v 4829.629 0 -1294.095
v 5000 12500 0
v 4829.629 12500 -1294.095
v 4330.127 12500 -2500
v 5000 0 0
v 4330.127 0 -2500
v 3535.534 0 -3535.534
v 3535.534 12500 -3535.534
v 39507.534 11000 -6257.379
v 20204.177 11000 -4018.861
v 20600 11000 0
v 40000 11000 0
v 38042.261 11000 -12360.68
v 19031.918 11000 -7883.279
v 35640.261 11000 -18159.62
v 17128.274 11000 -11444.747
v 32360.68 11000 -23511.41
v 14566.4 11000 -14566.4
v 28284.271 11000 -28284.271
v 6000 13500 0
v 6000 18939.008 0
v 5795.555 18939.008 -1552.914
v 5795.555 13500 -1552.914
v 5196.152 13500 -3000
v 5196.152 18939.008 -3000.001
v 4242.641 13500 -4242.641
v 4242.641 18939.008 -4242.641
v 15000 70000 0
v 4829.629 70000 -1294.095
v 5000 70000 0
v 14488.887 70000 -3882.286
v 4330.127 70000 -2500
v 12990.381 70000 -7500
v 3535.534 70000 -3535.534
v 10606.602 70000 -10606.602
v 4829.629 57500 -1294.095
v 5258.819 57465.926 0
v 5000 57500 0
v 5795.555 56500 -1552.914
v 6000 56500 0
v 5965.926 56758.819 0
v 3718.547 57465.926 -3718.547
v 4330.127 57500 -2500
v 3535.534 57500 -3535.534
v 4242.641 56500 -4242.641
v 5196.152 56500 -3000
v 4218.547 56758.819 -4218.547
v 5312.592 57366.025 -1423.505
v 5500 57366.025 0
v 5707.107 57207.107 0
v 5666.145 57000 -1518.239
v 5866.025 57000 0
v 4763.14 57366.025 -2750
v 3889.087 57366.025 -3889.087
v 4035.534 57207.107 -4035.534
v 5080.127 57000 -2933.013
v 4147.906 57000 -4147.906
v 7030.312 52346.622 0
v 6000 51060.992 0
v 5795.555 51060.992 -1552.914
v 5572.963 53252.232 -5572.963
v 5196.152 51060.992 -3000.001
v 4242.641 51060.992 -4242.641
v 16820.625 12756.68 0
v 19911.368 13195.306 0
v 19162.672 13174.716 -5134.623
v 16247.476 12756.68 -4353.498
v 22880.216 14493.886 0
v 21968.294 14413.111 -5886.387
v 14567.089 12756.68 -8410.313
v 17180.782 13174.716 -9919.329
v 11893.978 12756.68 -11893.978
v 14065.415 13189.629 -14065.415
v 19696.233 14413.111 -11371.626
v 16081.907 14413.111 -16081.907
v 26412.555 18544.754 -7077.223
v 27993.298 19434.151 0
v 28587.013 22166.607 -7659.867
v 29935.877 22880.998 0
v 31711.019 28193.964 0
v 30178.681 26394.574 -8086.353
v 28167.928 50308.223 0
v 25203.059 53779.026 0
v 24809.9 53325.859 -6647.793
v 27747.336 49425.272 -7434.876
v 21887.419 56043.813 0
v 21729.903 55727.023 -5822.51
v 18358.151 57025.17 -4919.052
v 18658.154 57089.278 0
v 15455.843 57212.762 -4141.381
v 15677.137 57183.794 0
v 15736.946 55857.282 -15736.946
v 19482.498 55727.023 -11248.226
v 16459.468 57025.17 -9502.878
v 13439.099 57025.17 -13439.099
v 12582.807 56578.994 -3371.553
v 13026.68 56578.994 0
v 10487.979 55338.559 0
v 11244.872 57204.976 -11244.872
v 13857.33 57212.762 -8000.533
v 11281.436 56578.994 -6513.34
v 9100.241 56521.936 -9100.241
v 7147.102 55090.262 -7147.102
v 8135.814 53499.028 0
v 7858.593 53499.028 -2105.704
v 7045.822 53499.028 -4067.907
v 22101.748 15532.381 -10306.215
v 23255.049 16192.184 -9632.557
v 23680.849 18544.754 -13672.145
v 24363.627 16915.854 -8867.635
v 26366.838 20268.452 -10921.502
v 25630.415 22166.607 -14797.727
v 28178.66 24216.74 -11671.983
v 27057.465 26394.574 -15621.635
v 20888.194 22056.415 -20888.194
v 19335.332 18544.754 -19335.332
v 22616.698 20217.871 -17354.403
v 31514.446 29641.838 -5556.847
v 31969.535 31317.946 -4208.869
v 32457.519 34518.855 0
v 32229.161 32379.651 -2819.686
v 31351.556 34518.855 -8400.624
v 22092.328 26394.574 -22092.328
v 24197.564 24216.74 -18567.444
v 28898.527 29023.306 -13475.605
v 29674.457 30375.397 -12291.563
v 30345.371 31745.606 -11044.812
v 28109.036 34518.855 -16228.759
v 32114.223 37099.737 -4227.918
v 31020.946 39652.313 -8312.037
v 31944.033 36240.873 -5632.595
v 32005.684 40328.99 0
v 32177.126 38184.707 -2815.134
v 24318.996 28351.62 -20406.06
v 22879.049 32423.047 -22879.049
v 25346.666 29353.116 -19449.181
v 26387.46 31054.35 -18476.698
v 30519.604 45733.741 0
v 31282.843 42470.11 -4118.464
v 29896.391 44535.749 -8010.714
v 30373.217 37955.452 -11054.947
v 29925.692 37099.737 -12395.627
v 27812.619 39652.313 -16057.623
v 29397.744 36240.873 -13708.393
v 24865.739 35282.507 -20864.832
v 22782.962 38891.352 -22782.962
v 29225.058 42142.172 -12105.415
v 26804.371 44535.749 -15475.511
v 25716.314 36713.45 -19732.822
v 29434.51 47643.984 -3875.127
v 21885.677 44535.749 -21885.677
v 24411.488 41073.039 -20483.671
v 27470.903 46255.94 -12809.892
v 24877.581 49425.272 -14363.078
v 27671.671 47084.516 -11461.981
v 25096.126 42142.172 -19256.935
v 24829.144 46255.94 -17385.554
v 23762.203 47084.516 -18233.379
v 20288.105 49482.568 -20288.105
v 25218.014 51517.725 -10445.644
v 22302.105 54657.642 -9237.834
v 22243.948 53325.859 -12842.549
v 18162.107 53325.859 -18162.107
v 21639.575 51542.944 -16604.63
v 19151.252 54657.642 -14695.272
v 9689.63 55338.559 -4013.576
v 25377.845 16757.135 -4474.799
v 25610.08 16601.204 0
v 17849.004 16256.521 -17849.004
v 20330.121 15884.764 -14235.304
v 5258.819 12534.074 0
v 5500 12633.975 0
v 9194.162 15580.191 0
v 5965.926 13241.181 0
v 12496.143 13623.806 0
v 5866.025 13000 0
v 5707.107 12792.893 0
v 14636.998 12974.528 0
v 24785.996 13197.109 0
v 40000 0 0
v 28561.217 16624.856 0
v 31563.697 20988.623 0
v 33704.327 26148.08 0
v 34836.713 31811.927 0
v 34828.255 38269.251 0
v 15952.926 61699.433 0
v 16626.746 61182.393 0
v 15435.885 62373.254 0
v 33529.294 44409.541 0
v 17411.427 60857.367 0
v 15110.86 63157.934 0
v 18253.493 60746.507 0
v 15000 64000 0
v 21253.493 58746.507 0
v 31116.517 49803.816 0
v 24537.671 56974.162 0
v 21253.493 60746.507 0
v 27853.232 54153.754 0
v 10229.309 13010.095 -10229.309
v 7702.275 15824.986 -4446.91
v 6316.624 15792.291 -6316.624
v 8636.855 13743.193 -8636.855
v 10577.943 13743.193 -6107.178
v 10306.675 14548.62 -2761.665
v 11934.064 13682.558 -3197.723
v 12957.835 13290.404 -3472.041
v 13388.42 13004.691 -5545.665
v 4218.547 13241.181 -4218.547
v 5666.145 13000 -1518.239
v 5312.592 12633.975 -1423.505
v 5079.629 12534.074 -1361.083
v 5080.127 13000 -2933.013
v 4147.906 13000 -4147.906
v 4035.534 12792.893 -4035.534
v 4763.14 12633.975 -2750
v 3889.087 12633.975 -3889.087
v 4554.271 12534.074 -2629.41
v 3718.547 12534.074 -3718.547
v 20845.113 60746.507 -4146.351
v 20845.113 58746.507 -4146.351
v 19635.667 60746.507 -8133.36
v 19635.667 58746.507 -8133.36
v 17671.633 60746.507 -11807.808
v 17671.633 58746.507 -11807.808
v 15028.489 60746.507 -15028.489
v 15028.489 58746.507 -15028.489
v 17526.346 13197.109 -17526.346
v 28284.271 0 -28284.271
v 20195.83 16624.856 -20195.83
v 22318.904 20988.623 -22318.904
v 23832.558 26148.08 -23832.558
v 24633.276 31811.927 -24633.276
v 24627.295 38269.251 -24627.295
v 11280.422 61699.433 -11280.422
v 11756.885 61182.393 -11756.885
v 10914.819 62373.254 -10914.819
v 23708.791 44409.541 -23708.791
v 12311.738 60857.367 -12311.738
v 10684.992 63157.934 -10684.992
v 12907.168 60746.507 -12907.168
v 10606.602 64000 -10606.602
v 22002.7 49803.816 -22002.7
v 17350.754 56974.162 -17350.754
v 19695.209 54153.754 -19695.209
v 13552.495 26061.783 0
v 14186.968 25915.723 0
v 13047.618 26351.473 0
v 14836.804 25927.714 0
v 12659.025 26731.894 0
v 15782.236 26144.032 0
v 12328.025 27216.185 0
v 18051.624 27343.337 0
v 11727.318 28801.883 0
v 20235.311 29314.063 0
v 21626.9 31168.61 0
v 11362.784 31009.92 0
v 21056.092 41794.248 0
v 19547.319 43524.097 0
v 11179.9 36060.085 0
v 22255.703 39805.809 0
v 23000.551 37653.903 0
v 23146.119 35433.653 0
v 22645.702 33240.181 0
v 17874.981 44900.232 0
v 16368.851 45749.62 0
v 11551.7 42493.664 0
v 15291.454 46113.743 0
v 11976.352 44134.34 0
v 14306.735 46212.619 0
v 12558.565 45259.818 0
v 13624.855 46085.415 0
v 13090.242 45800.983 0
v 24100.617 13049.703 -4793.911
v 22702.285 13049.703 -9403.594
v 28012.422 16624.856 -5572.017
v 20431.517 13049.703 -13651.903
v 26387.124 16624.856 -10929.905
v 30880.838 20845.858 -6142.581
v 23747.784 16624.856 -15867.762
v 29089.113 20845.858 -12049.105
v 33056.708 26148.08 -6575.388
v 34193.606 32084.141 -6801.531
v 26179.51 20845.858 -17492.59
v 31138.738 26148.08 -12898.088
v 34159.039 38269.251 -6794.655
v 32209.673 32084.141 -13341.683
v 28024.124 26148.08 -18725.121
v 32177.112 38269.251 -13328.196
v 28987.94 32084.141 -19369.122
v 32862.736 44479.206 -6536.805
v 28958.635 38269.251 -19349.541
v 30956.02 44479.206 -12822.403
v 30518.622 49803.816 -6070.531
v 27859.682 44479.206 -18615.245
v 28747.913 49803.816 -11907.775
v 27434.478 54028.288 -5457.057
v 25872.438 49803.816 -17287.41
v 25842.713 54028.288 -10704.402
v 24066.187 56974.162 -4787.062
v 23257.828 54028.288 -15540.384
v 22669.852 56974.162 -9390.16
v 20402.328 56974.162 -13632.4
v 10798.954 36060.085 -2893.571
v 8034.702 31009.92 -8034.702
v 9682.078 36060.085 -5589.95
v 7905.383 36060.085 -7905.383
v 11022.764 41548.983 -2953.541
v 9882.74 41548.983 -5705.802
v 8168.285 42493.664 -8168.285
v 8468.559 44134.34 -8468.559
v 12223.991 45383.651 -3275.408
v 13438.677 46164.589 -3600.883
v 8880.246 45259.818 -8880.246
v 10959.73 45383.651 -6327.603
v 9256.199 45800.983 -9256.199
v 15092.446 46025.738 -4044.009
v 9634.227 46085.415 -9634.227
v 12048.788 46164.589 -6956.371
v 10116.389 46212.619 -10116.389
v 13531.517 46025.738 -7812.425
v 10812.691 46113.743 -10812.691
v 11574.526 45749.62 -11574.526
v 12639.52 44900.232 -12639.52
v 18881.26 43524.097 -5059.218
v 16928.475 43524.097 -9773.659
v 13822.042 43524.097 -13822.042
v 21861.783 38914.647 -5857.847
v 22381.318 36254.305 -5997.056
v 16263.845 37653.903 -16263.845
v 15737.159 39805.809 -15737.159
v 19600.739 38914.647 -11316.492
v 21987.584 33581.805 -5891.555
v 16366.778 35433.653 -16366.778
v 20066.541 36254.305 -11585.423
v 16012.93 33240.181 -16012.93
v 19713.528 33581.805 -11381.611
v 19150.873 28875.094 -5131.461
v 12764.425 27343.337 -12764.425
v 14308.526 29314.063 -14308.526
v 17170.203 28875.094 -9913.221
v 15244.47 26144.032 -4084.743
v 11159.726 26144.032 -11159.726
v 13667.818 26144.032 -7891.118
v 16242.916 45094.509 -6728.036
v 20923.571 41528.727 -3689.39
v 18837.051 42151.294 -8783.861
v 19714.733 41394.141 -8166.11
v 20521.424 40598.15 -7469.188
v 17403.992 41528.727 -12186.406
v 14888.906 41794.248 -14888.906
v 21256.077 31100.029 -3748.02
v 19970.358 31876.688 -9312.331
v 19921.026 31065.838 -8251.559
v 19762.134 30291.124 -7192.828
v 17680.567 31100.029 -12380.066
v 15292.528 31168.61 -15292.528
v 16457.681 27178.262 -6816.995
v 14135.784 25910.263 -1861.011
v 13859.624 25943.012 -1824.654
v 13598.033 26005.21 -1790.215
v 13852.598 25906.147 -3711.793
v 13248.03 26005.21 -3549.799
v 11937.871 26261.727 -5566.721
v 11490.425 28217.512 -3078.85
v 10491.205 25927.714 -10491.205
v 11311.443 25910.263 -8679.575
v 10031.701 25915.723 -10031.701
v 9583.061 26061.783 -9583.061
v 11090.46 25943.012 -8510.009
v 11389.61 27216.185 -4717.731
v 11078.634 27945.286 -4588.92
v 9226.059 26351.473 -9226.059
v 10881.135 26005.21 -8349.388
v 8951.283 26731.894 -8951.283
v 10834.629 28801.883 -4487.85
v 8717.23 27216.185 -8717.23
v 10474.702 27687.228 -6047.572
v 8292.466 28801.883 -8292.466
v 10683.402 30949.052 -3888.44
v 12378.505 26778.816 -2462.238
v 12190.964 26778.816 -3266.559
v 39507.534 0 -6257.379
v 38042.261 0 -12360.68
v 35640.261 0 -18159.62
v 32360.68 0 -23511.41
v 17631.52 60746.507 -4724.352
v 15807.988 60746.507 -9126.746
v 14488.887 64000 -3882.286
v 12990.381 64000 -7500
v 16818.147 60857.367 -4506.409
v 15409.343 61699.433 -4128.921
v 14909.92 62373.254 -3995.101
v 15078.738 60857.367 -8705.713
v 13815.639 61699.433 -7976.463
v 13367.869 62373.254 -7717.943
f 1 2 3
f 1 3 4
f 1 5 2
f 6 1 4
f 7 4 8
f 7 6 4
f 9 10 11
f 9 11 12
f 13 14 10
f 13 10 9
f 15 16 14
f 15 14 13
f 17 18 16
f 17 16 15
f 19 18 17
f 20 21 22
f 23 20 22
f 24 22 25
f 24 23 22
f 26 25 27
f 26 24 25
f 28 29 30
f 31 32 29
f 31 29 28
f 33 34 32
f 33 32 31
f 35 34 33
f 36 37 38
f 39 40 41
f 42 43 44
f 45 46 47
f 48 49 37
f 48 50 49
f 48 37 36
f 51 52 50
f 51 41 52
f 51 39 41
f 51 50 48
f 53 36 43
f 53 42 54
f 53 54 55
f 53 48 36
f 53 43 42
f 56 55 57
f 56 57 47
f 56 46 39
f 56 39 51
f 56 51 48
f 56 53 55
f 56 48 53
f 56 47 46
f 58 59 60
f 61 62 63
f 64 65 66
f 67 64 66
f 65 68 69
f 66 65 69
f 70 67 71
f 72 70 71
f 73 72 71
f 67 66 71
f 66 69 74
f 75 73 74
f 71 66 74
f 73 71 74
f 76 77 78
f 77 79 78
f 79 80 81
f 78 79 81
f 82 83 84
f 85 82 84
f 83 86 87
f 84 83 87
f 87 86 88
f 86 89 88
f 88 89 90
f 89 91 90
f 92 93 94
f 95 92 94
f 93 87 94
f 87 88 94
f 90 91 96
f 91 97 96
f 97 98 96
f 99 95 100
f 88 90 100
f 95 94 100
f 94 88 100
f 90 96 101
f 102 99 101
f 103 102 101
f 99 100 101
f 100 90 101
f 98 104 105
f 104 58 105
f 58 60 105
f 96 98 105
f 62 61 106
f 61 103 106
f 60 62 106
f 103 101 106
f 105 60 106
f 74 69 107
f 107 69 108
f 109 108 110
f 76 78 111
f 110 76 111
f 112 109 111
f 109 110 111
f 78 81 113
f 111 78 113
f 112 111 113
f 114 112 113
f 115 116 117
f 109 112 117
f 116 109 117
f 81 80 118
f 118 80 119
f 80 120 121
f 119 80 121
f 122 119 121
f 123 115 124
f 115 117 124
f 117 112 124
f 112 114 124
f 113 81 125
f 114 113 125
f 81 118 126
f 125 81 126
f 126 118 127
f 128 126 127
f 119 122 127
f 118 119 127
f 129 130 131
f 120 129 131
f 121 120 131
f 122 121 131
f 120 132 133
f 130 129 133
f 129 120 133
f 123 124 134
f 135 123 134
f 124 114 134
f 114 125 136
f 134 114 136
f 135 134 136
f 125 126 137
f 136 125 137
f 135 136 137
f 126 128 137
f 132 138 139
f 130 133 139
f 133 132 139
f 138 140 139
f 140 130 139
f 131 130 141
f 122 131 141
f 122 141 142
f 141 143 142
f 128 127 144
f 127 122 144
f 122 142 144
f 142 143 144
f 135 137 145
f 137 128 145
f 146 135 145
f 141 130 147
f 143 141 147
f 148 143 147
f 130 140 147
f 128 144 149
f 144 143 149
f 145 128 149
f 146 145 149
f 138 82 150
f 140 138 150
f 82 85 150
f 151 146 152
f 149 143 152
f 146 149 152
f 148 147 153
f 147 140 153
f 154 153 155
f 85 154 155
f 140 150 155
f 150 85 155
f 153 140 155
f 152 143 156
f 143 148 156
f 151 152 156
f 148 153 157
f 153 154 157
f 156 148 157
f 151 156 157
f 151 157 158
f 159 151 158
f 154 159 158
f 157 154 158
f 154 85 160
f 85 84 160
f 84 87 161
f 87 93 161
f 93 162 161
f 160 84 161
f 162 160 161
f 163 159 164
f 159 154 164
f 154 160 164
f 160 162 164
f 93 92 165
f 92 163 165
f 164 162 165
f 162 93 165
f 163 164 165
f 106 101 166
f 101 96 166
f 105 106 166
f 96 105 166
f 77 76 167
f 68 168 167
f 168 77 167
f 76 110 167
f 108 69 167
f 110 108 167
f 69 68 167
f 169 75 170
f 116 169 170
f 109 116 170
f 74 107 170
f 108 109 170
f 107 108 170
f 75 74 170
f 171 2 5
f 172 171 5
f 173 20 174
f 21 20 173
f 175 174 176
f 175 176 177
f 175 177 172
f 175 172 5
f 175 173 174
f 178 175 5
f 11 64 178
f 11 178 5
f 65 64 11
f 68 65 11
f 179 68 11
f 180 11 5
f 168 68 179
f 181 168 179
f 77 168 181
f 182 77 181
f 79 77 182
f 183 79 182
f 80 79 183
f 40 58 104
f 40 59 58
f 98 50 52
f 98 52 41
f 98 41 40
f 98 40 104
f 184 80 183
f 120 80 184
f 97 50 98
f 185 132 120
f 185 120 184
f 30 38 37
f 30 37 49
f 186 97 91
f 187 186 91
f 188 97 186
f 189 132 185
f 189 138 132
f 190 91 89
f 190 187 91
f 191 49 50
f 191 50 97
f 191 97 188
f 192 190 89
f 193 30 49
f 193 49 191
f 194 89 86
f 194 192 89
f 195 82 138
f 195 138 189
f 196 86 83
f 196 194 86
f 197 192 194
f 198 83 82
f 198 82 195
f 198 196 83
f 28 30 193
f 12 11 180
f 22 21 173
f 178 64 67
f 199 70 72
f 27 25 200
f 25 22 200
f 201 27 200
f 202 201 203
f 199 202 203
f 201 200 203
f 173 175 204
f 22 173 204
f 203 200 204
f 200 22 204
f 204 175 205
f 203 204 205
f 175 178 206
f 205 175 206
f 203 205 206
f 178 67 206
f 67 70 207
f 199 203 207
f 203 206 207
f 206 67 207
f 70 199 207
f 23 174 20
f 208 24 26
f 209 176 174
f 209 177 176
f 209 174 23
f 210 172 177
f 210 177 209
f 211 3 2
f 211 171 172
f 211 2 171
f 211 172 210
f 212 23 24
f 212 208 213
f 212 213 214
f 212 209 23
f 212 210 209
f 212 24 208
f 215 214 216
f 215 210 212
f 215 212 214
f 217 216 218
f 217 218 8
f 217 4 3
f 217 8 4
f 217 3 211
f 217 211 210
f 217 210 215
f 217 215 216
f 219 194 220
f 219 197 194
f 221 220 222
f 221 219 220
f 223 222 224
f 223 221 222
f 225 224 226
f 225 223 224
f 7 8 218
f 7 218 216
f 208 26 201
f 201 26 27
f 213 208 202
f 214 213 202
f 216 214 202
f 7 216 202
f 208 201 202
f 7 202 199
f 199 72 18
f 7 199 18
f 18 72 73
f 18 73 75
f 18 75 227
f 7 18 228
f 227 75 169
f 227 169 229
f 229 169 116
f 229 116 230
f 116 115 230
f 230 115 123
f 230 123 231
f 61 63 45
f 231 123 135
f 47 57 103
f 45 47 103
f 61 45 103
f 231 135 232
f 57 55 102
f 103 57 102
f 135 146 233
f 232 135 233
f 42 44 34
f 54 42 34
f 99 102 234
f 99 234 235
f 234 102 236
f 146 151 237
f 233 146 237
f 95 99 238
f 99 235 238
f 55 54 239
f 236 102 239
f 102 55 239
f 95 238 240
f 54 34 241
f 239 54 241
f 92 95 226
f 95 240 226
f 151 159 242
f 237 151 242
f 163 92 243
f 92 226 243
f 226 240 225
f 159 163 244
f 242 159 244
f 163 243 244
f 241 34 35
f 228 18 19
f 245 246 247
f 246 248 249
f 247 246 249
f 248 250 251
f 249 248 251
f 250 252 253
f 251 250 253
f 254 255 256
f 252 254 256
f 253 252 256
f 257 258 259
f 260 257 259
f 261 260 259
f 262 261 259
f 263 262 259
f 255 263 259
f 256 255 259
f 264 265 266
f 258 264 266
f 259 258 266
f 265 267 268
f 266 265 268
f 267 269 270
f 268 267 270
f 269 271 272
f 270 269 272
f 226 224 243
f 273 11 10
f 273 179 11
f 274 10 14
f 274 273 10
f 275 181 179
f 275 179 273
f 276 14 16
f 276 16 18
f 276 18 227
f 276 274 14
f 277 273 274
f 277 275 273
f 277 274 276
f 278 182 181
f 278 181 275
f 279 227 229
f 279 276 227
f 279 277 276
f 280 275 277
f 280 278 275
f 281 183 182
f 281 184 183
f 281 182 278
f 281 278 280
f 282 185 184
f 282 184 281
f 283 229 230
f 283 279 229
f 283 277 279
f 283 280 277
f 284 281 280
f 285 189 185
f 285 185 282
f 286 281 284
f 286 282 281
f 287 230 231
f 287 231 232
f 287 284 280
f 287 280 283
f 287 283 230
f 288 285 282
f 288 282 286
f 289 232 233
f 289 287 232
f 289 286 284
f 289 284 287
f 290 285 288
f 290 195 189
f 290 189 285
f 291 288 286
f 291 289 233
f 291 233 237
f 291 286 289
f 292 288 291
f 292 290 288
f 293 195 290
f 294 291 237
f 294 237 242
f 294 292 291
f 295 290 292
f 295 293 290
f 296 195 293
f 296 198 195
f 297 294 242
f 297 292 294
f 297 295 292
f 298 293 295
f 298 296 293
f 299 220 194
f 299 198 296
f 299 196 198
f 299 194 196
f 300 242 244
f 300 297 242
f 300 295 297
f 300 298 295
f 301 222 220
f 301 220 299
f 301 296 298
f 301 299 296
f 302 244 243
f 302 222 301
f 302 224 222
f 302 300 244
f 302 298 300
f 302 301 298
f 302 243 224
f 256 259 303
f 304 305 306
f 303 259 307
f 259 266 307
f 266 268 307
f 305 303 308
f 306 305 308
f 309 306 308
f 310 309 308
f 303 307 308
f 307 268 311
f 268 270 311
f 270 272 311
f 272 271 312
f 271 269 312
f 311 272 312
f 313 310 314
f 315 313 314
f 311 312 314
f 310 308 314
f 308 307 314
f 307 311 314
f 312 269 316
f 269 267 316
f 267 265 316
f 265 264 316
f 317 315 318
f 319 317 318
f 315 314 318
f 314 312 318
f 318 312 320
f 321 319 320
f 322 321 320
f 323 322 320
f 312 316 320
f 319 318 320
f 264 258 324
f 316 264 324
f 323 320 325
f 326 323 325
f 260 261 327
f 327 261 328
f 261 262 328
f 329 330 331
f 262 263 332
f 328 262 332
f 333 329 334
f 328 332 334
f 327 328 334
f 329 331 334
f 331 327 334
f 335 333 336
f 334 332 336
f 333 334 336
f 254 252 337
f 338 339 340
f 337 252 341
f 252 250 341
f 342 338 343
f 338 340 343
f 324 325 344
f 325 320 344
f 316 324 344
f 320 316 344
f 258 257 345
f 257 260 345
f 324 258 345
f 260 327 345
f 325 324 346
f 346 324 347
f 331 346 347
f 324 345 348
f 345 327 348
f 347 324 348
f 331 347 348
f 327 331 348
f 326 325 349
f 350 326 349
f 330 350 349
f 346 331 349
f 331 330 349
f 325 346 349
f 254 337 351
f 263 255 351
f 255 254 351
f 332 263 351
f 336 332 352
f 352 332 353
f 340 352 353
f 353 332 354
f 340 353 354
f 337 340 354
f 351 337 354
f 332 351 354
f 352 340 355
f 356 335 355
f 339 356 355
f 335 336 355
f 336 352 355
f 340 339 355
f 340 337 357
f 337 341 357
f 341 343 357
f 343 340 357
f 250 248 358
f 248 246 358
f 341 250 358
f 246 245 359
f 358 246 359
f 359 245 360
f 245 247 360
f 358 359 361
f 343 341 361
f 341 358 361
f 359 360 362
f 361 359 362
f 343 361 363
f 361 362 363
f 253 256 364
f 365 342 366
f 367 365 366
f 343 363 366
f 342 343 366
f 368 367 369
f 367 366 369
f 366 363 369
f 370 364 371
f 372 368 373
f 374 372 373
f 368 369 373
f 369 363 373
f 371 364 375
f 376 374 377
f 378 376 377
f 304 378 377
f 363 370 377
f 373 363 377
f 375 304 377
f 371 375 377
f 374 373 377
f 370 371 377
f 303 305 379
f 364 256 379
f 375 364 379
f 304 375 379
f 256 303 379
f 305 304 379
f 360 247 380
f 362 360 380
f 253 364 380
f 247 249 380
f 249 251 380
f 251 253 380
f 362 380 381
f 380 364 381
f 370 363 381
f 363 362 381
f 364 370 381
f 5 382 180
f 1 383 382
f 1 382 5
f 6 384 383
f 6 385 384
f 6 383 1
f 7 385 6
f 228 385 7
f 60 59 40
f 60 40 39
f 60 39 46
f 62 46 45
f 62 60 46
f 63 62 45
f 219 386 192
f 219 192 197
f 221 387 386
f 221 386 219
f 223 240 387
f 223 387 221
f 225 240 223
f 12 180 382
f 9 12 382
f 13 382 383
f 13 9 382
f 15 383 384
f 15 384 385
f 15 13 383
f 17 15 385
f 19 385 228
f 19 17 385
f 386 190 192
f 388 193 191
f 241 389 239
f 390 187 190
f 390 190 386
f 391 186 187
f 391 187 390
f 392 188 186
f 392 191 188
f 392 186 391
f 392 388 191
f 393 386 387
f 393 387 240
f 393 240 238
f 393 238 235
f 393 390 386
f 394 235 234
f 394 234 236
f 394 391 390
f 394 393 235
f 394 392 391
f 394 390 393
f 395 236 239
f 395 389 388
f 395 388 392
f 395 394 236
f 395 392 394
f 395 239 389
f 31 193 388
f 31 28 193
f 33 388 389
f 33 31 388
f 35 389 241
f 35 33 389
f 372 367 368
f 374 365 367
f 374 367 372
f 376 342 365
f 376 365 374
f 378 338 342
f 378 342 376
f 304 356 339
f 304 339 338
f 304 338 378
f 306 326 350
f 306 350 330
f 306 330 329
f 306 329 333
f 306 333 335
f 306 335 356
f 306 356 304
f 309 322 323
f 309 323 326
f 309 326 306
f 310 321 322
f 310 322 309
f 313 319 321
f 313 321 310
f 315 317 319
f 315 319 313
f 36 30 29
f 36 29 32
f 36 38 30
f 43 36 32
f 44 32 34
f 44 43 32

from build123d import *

# Parameters (mm, degrees)
REVOLU_O2_ANGLE = 45
ESBO_O3_RX      = 22243.320272913
ESBO_O3_RY      = 15640.553132373
REVOLU_O3_ANGLE = 45


with BuildPart() as part:
    # Esboço2 → Revolução2 (revolve)
    with BuildSketch(Plane.XY):
        with BuildLine():
            Line((5000, 70000), (5000, 57500))
            ThreePointArc((5000, 57500), (5707.106781187, 57207.106781187), (6000, 56500))
            Line((6000, 56500), (6000, 13500))
            ThreePointArc((6000, 13500), (5707.106781187, 12792.893218813), (5000, 12500))
            Line((5000, 12500), (5000, 0))
            Line((5000, 0), (40000, 0))
            Line((40000, 0), (40000, 11000))
            Line((40000, 11000), (20600, 11000))
            add(Edge.make_bspline(
                [(20600, 11000), (82470.907399998, 33557.10165625), (21253.492737805, 58746.507262195)],
                knots=[3.425386763, 3.425386763, 3.425386763, 5.965177753, 5.965177753, 5.965177753], degree=2, weights=[1, 0.296380684, 1]))
            Line((21253.492737805, 58746.507262195), (21253.492737805, 60746.507262195))
            Line((21253.492737805, 60746.507262195), (18253.492737805, 60746.507262195))
            ThreePointArc((18253.492737805, 60746.507262195), (15952.925960362, 61699.433222557), (15000, 64000))
            Line((15000, 64000), (15000, 70000))
            Line((15000, 70000), (5000, 70000))
        make_face()
    revolve(axis=Axis((0, 0, 0), (0, 1, 0)), revolution_arc=REVOLU_O2_ANGLE)

    # Esboço3 → Corte-Revolução1 (revolve, cut)
    with BuildSketch(Plane.XY):
        with Locations(Location((16820.62504111, 35000), (0, 0, -90))):
            Ellipse(ESBO_O3_RX, ESBO_O3_RY)
    revolve(axis=Axis((0, 0, 0), (0, 1, 0)), mode=Mode.SUBTRACT)


with BuildPart() as body_2:
    # Esboço4 → Revolução3 (revolve)
    with BuildSketch(Plane.XY):
        with BuildLine():
            add(Edge.make_bspline(
                [(11179.900249992, 36060.085021), (11179.900249992, 40628.19603411), (11598.590022909, 51362.209201007), (29822.454563098, 36060.085021), (11598.590022909, 20757.960840993), (11179.900249992, 31491.97400789), (11179.900249992, 36060.085021)],
                knots=[0, 0, 0, 0, 0.212786725, 0.5, 0.787213275, 1, 1, 1, 1], degree=3))
        make_face()
    revolve(axis=Axis((0, 0, 0), (0, 1, 0)), revolution_arc=REVOLU_O3_ANGLE)


solid = Compound([part.part, body_2.part])
